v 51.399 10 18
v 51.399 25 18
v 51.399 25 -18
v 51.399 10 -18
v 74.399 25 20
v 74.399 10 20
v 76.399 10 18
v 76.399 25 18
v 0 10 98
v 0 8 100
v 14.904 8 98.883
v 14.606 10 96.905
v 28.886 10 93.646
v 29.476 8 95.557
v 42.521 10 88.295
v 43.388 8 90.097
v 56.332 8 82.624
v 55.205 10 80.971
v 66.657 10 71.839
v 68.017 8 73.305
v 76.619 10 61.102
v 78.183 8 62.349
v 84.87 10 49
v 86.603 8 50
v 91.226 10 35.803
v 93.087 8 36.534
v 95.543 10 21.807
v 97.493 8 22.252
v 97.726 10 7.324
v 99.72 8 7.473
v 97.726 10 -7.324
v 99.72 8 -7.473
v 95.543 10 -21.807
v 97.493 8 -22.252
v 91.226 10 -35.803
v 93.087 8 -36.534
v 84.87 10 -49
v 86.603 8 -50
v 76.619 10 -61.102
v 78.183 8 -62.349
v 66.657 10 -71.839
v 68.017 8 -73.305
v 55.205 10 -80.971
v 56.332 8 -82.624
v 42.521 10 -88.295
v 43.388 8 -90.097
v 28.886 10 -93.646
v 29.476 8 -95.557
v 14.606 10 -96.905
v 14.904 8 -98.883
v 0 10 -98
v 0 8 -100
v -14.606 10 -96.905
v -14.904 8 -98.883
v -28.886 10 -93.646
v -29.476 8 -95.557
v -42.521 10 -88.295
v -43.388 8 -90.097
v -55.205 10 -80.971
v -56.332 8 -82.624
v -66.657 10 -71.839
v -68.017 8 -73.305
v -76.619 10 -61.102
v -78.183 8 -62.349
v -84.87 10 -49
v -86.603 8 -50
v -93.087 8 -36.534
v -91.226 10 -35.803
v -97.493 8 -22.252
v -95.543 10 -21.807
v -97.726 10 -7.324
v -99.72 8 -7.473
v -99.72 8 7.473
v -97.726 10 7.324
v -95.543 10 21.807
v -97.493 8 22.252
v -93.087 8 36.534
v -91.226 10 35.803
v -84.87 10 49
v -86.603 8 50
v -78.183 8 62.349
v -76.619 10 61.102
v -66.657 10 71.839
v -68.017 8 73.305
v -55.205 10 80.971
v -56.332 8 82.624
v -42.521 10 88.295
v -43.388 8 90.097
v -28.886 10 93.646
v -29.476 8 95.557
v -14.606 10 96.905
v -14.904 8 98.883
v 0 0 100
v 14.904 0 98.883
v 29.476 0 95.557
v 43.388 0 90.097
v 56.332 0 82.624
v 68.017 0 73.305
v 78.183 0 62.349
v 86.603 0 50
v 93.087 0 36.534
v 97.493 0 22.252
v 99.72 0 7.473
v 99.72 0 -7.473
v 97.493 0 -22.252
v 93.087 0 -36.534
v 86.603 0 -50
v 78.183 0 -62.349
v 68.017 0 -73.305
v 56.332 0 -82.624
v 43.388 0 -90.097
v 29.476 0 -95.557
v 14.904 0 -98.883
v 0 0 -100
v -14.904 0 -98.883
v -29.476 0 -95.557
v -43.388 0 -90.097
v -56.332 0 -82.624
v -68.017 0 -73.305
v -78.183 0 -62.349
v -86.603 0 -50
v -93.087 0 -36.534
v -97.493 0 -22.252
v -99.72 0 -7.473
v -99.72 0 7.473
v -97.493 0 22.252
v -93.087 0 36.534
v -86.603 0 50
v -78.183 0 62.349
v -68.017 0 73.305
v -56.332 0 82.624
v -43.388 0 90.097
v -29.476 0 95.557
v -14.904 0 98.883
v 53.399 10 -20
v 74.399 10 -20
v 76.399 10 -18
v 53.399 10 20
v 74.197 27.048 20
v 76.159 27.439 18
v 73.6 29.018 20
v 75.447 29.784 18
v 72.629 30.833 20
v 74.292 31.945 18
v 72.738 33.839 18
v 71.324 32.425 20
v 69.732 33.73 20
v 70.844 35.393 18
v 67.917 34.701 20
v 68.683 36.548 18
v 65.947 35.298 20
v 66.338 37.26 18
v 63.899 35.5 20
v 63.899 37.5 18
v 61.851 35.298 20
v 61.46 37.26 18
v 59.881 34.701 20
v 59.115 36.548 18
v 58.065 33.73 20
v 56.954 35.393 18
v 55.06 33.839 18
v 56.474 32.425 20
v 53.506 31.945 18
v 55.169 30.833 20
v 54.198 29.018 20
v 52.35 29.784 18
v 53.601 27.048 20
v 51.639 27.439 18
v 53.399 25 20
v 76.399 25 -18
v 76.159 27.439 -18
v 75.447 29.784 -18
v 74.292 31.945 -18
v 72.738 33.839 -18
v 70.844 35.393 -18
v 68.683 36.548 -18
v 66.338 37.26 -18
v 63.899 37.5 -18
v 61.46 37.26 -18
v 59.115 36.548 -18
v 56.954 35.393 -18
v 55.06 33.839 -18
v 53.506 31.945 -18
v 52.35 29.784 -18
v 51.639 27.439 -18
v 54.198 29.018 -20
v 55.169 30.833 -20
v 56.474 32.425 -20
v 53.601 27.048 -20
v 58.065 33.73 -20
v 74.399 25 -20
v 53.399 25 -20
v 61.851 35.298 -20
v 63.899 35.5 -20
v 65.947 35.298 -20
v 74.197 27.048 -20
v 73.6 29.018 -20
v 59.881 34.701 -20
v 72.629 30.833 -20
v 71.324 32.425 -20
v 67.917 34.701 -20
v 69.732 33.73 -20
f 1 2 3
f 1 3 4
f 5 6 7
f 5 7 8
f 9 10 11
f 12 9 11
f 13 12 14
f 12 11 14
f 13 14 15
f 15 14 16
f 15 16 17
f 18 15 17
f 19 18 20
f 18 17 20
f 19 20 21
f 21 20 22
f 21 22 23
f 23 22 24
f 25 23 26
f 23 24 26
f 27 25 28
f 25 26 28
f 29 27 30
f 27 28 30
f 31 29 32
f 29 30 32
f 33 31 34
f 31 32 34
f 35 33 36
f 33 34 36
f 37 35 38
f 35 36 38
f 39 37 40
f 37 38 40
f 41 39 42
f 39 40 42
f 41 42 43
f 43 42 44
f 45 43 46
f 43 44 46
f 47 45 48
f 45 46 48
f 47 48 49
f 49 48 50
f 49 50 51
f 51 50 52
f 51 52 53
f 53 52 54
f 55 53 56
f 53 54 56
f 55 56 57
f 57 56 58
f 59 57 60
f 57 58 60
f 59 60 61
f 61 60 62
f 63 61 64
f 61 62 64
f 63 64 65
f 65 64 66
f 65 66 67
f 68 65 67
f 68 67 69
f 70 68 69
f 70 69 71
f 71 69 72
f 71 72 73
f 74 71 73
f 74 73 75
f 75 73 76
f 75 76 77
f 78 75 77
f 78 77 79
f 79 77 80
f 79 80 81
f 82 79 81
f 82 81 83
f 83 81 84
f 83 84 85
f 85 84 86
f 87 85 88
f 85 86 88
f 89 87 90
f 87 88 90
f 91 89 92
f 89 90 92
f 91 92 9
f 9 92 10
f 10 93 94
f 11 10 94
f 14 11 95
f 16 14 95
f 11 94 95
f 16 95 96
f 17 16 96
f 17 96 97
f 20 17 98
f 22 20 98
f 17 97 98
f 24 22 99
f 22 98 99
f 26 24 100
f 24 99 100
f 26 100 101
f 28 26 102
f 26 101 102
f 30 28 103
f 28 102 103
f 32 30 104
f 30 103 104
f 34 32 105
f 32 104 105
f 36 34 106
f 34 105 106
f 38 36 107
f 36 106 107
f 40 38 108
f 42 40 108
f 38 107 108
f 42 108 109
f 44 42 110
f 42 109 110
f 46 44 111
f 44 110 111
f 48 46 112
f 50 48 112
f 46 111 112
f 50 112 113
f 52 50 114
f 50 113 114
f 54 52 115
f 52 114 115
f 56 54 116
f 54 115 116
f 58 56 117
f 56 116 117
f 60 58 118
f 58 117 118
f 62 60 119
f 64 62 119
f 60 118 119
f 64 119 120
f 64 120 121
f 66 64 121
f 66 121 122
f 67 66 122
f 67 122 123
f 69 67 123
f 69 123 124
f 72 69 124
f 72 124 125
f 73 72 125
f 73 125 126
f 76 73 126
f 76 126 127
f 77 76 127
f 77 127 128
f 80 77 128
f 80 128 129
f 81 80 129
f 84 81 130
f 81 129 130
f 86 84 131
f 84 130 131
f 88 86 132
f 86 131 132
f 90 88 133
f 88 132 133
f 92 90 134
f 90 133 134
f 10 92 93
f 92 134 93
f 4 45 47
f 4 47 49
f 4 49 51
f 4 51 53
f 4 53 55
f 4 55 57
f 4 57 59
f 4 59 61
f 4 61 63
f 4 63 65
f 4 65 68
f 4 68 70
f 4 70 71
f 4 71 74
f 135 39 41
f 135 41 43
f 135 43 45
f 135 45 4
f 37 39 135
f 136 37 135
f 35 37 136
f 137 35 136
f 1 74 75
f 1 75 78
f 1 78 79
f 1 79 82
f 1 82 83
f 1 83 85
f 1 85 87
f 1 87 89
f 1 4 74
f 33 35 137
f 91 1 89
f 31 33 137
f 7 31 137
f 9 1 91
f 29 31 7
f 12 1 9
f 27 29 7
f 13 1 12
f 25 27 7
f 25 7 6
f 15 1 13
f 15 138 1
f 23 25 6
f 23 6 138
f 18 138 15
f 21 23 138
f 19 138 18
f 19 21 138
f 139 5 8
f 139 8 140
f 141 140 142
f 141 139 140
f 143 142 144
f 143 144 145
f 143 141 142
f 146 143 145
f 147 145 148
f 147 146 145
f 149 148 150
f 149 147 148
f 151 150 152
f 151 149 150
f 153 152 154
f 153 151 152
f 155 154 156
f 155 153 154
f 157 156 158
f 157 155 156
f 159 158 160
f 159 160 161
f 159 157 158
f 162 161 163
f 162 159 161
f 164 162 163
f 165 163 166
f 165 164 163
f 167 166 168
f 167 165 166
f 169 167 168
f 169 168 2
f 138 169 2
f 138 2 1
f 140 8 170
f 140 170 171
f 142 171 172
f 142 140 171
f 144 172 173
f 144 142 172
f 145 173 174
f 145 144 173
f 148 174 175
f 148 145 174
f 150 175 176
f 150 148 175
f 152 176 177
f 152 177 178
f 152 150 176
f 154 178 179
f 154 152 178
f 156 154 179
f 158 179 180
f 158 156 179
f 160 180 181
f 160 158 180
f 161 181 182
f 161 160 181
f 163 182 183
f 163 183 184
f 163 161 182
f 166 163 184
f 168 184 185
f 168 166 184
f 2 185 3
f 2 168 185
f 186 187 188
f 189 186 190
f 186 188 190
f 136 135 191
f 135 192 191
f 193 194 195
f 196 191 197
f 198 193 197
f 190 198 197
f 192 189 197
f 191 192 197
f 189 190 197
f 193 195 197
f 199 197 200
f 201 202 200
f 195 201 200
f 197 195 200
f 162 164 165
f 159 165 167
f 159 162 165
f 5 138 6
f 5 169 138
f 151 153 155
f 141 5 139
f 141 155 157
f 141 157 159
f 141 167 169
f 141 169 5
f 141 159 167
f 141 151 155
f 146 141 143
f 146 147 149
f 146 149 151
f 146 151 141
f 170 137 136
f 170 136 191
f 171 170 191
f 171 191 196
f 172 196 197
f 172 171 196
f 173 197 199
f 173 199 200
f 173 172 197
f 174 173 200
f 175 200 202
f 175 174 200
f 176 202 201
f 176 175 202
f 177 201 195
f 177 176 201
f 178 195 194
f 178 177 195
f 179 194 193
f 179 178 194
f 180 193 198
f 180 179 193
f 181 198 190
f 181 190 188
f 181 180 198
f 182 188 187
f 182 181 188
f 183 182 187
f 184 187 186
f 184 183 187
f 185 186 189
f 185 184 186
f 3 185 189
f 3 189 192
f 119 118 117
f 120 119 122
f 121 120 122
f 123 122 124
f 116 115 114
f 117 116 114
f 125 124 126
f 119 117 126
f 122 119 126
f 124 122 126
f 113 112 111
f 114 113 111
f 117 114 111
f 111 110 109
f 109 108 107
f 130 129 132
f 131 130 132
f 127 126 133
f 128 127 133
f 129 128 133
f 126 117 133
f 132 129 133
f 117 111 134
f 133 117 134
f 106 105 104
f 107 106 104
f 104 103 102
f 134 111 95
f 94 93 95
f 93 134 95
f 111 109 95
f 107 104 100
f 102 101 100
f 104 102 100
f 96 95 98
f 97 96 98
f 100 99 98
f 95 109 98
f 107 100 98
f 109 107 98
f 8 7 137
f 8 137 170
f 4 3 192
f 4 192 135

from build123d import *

# Parameters (mm, degrees)
SKETCH_1_R      = 100
EXTRUDE_1_DEPTH = 10
EXTRUDE_2_DEPTH = 20
CHAMFER_1_SIZE  = 2
CHAMFER_2_SIZE  = 2


with BuildPart() as part:
    # 草图1 → 凸台-拉伸1 (new body)
    with BuildSketch(Plane(origin=(0, 0, 0), x_dir=(1, 0, 0), z_dir=(0, 1, 0))):
        with Locations(Location((0, 0, 0), (0, 0, 270))):
            Circle(SKETCH_1_R)
    extrude(amount=EXTRUDE_1_DEPTH)

    # 草图2 → 凸台-拉伸2 (add, symmetric)
    with BuildSketch(Plane.XY):
        with BuildLine():
            Line((51.398957954, 25), (51.398957954, 10))
            Line((51.398957954, 10), (76.398957954, 10))
            Line((76.398957954, 10), (76.398957954, 25))
            ThreePointArc((76.398957954, 25), (63.898957954, 37.5), (51.398957954, 25))
        make_face()
    extrude(amount=EXTRUDE_2_DEPTH, both=True)

    # 倒角1
    chamfer_1_edges = [part.edges().sort_by_distance(p)[0] for p in [
        (51.398957954, 17.5, 20),
        (76.398957954, 17.5, 20),
        (63.898957954, 37.5, -20),
        (51.398957954, 17.5, -20),
        (76.398957954, 17.5, -20),
        (63.898957954, 37.5, 20),
    ]]
    chamfer(chamfer_1_edges, length=CHAMFER_1_SIZE)

    # 倒角2
    chamfer_2_edges = [part.edges().sort_by_distance(p)[0] for p in [
        (0, 10, -100),
    ]]
    chamfer(chamfer_2_edges, length=CHAMFER_2_SIZE)


solid = part.part
